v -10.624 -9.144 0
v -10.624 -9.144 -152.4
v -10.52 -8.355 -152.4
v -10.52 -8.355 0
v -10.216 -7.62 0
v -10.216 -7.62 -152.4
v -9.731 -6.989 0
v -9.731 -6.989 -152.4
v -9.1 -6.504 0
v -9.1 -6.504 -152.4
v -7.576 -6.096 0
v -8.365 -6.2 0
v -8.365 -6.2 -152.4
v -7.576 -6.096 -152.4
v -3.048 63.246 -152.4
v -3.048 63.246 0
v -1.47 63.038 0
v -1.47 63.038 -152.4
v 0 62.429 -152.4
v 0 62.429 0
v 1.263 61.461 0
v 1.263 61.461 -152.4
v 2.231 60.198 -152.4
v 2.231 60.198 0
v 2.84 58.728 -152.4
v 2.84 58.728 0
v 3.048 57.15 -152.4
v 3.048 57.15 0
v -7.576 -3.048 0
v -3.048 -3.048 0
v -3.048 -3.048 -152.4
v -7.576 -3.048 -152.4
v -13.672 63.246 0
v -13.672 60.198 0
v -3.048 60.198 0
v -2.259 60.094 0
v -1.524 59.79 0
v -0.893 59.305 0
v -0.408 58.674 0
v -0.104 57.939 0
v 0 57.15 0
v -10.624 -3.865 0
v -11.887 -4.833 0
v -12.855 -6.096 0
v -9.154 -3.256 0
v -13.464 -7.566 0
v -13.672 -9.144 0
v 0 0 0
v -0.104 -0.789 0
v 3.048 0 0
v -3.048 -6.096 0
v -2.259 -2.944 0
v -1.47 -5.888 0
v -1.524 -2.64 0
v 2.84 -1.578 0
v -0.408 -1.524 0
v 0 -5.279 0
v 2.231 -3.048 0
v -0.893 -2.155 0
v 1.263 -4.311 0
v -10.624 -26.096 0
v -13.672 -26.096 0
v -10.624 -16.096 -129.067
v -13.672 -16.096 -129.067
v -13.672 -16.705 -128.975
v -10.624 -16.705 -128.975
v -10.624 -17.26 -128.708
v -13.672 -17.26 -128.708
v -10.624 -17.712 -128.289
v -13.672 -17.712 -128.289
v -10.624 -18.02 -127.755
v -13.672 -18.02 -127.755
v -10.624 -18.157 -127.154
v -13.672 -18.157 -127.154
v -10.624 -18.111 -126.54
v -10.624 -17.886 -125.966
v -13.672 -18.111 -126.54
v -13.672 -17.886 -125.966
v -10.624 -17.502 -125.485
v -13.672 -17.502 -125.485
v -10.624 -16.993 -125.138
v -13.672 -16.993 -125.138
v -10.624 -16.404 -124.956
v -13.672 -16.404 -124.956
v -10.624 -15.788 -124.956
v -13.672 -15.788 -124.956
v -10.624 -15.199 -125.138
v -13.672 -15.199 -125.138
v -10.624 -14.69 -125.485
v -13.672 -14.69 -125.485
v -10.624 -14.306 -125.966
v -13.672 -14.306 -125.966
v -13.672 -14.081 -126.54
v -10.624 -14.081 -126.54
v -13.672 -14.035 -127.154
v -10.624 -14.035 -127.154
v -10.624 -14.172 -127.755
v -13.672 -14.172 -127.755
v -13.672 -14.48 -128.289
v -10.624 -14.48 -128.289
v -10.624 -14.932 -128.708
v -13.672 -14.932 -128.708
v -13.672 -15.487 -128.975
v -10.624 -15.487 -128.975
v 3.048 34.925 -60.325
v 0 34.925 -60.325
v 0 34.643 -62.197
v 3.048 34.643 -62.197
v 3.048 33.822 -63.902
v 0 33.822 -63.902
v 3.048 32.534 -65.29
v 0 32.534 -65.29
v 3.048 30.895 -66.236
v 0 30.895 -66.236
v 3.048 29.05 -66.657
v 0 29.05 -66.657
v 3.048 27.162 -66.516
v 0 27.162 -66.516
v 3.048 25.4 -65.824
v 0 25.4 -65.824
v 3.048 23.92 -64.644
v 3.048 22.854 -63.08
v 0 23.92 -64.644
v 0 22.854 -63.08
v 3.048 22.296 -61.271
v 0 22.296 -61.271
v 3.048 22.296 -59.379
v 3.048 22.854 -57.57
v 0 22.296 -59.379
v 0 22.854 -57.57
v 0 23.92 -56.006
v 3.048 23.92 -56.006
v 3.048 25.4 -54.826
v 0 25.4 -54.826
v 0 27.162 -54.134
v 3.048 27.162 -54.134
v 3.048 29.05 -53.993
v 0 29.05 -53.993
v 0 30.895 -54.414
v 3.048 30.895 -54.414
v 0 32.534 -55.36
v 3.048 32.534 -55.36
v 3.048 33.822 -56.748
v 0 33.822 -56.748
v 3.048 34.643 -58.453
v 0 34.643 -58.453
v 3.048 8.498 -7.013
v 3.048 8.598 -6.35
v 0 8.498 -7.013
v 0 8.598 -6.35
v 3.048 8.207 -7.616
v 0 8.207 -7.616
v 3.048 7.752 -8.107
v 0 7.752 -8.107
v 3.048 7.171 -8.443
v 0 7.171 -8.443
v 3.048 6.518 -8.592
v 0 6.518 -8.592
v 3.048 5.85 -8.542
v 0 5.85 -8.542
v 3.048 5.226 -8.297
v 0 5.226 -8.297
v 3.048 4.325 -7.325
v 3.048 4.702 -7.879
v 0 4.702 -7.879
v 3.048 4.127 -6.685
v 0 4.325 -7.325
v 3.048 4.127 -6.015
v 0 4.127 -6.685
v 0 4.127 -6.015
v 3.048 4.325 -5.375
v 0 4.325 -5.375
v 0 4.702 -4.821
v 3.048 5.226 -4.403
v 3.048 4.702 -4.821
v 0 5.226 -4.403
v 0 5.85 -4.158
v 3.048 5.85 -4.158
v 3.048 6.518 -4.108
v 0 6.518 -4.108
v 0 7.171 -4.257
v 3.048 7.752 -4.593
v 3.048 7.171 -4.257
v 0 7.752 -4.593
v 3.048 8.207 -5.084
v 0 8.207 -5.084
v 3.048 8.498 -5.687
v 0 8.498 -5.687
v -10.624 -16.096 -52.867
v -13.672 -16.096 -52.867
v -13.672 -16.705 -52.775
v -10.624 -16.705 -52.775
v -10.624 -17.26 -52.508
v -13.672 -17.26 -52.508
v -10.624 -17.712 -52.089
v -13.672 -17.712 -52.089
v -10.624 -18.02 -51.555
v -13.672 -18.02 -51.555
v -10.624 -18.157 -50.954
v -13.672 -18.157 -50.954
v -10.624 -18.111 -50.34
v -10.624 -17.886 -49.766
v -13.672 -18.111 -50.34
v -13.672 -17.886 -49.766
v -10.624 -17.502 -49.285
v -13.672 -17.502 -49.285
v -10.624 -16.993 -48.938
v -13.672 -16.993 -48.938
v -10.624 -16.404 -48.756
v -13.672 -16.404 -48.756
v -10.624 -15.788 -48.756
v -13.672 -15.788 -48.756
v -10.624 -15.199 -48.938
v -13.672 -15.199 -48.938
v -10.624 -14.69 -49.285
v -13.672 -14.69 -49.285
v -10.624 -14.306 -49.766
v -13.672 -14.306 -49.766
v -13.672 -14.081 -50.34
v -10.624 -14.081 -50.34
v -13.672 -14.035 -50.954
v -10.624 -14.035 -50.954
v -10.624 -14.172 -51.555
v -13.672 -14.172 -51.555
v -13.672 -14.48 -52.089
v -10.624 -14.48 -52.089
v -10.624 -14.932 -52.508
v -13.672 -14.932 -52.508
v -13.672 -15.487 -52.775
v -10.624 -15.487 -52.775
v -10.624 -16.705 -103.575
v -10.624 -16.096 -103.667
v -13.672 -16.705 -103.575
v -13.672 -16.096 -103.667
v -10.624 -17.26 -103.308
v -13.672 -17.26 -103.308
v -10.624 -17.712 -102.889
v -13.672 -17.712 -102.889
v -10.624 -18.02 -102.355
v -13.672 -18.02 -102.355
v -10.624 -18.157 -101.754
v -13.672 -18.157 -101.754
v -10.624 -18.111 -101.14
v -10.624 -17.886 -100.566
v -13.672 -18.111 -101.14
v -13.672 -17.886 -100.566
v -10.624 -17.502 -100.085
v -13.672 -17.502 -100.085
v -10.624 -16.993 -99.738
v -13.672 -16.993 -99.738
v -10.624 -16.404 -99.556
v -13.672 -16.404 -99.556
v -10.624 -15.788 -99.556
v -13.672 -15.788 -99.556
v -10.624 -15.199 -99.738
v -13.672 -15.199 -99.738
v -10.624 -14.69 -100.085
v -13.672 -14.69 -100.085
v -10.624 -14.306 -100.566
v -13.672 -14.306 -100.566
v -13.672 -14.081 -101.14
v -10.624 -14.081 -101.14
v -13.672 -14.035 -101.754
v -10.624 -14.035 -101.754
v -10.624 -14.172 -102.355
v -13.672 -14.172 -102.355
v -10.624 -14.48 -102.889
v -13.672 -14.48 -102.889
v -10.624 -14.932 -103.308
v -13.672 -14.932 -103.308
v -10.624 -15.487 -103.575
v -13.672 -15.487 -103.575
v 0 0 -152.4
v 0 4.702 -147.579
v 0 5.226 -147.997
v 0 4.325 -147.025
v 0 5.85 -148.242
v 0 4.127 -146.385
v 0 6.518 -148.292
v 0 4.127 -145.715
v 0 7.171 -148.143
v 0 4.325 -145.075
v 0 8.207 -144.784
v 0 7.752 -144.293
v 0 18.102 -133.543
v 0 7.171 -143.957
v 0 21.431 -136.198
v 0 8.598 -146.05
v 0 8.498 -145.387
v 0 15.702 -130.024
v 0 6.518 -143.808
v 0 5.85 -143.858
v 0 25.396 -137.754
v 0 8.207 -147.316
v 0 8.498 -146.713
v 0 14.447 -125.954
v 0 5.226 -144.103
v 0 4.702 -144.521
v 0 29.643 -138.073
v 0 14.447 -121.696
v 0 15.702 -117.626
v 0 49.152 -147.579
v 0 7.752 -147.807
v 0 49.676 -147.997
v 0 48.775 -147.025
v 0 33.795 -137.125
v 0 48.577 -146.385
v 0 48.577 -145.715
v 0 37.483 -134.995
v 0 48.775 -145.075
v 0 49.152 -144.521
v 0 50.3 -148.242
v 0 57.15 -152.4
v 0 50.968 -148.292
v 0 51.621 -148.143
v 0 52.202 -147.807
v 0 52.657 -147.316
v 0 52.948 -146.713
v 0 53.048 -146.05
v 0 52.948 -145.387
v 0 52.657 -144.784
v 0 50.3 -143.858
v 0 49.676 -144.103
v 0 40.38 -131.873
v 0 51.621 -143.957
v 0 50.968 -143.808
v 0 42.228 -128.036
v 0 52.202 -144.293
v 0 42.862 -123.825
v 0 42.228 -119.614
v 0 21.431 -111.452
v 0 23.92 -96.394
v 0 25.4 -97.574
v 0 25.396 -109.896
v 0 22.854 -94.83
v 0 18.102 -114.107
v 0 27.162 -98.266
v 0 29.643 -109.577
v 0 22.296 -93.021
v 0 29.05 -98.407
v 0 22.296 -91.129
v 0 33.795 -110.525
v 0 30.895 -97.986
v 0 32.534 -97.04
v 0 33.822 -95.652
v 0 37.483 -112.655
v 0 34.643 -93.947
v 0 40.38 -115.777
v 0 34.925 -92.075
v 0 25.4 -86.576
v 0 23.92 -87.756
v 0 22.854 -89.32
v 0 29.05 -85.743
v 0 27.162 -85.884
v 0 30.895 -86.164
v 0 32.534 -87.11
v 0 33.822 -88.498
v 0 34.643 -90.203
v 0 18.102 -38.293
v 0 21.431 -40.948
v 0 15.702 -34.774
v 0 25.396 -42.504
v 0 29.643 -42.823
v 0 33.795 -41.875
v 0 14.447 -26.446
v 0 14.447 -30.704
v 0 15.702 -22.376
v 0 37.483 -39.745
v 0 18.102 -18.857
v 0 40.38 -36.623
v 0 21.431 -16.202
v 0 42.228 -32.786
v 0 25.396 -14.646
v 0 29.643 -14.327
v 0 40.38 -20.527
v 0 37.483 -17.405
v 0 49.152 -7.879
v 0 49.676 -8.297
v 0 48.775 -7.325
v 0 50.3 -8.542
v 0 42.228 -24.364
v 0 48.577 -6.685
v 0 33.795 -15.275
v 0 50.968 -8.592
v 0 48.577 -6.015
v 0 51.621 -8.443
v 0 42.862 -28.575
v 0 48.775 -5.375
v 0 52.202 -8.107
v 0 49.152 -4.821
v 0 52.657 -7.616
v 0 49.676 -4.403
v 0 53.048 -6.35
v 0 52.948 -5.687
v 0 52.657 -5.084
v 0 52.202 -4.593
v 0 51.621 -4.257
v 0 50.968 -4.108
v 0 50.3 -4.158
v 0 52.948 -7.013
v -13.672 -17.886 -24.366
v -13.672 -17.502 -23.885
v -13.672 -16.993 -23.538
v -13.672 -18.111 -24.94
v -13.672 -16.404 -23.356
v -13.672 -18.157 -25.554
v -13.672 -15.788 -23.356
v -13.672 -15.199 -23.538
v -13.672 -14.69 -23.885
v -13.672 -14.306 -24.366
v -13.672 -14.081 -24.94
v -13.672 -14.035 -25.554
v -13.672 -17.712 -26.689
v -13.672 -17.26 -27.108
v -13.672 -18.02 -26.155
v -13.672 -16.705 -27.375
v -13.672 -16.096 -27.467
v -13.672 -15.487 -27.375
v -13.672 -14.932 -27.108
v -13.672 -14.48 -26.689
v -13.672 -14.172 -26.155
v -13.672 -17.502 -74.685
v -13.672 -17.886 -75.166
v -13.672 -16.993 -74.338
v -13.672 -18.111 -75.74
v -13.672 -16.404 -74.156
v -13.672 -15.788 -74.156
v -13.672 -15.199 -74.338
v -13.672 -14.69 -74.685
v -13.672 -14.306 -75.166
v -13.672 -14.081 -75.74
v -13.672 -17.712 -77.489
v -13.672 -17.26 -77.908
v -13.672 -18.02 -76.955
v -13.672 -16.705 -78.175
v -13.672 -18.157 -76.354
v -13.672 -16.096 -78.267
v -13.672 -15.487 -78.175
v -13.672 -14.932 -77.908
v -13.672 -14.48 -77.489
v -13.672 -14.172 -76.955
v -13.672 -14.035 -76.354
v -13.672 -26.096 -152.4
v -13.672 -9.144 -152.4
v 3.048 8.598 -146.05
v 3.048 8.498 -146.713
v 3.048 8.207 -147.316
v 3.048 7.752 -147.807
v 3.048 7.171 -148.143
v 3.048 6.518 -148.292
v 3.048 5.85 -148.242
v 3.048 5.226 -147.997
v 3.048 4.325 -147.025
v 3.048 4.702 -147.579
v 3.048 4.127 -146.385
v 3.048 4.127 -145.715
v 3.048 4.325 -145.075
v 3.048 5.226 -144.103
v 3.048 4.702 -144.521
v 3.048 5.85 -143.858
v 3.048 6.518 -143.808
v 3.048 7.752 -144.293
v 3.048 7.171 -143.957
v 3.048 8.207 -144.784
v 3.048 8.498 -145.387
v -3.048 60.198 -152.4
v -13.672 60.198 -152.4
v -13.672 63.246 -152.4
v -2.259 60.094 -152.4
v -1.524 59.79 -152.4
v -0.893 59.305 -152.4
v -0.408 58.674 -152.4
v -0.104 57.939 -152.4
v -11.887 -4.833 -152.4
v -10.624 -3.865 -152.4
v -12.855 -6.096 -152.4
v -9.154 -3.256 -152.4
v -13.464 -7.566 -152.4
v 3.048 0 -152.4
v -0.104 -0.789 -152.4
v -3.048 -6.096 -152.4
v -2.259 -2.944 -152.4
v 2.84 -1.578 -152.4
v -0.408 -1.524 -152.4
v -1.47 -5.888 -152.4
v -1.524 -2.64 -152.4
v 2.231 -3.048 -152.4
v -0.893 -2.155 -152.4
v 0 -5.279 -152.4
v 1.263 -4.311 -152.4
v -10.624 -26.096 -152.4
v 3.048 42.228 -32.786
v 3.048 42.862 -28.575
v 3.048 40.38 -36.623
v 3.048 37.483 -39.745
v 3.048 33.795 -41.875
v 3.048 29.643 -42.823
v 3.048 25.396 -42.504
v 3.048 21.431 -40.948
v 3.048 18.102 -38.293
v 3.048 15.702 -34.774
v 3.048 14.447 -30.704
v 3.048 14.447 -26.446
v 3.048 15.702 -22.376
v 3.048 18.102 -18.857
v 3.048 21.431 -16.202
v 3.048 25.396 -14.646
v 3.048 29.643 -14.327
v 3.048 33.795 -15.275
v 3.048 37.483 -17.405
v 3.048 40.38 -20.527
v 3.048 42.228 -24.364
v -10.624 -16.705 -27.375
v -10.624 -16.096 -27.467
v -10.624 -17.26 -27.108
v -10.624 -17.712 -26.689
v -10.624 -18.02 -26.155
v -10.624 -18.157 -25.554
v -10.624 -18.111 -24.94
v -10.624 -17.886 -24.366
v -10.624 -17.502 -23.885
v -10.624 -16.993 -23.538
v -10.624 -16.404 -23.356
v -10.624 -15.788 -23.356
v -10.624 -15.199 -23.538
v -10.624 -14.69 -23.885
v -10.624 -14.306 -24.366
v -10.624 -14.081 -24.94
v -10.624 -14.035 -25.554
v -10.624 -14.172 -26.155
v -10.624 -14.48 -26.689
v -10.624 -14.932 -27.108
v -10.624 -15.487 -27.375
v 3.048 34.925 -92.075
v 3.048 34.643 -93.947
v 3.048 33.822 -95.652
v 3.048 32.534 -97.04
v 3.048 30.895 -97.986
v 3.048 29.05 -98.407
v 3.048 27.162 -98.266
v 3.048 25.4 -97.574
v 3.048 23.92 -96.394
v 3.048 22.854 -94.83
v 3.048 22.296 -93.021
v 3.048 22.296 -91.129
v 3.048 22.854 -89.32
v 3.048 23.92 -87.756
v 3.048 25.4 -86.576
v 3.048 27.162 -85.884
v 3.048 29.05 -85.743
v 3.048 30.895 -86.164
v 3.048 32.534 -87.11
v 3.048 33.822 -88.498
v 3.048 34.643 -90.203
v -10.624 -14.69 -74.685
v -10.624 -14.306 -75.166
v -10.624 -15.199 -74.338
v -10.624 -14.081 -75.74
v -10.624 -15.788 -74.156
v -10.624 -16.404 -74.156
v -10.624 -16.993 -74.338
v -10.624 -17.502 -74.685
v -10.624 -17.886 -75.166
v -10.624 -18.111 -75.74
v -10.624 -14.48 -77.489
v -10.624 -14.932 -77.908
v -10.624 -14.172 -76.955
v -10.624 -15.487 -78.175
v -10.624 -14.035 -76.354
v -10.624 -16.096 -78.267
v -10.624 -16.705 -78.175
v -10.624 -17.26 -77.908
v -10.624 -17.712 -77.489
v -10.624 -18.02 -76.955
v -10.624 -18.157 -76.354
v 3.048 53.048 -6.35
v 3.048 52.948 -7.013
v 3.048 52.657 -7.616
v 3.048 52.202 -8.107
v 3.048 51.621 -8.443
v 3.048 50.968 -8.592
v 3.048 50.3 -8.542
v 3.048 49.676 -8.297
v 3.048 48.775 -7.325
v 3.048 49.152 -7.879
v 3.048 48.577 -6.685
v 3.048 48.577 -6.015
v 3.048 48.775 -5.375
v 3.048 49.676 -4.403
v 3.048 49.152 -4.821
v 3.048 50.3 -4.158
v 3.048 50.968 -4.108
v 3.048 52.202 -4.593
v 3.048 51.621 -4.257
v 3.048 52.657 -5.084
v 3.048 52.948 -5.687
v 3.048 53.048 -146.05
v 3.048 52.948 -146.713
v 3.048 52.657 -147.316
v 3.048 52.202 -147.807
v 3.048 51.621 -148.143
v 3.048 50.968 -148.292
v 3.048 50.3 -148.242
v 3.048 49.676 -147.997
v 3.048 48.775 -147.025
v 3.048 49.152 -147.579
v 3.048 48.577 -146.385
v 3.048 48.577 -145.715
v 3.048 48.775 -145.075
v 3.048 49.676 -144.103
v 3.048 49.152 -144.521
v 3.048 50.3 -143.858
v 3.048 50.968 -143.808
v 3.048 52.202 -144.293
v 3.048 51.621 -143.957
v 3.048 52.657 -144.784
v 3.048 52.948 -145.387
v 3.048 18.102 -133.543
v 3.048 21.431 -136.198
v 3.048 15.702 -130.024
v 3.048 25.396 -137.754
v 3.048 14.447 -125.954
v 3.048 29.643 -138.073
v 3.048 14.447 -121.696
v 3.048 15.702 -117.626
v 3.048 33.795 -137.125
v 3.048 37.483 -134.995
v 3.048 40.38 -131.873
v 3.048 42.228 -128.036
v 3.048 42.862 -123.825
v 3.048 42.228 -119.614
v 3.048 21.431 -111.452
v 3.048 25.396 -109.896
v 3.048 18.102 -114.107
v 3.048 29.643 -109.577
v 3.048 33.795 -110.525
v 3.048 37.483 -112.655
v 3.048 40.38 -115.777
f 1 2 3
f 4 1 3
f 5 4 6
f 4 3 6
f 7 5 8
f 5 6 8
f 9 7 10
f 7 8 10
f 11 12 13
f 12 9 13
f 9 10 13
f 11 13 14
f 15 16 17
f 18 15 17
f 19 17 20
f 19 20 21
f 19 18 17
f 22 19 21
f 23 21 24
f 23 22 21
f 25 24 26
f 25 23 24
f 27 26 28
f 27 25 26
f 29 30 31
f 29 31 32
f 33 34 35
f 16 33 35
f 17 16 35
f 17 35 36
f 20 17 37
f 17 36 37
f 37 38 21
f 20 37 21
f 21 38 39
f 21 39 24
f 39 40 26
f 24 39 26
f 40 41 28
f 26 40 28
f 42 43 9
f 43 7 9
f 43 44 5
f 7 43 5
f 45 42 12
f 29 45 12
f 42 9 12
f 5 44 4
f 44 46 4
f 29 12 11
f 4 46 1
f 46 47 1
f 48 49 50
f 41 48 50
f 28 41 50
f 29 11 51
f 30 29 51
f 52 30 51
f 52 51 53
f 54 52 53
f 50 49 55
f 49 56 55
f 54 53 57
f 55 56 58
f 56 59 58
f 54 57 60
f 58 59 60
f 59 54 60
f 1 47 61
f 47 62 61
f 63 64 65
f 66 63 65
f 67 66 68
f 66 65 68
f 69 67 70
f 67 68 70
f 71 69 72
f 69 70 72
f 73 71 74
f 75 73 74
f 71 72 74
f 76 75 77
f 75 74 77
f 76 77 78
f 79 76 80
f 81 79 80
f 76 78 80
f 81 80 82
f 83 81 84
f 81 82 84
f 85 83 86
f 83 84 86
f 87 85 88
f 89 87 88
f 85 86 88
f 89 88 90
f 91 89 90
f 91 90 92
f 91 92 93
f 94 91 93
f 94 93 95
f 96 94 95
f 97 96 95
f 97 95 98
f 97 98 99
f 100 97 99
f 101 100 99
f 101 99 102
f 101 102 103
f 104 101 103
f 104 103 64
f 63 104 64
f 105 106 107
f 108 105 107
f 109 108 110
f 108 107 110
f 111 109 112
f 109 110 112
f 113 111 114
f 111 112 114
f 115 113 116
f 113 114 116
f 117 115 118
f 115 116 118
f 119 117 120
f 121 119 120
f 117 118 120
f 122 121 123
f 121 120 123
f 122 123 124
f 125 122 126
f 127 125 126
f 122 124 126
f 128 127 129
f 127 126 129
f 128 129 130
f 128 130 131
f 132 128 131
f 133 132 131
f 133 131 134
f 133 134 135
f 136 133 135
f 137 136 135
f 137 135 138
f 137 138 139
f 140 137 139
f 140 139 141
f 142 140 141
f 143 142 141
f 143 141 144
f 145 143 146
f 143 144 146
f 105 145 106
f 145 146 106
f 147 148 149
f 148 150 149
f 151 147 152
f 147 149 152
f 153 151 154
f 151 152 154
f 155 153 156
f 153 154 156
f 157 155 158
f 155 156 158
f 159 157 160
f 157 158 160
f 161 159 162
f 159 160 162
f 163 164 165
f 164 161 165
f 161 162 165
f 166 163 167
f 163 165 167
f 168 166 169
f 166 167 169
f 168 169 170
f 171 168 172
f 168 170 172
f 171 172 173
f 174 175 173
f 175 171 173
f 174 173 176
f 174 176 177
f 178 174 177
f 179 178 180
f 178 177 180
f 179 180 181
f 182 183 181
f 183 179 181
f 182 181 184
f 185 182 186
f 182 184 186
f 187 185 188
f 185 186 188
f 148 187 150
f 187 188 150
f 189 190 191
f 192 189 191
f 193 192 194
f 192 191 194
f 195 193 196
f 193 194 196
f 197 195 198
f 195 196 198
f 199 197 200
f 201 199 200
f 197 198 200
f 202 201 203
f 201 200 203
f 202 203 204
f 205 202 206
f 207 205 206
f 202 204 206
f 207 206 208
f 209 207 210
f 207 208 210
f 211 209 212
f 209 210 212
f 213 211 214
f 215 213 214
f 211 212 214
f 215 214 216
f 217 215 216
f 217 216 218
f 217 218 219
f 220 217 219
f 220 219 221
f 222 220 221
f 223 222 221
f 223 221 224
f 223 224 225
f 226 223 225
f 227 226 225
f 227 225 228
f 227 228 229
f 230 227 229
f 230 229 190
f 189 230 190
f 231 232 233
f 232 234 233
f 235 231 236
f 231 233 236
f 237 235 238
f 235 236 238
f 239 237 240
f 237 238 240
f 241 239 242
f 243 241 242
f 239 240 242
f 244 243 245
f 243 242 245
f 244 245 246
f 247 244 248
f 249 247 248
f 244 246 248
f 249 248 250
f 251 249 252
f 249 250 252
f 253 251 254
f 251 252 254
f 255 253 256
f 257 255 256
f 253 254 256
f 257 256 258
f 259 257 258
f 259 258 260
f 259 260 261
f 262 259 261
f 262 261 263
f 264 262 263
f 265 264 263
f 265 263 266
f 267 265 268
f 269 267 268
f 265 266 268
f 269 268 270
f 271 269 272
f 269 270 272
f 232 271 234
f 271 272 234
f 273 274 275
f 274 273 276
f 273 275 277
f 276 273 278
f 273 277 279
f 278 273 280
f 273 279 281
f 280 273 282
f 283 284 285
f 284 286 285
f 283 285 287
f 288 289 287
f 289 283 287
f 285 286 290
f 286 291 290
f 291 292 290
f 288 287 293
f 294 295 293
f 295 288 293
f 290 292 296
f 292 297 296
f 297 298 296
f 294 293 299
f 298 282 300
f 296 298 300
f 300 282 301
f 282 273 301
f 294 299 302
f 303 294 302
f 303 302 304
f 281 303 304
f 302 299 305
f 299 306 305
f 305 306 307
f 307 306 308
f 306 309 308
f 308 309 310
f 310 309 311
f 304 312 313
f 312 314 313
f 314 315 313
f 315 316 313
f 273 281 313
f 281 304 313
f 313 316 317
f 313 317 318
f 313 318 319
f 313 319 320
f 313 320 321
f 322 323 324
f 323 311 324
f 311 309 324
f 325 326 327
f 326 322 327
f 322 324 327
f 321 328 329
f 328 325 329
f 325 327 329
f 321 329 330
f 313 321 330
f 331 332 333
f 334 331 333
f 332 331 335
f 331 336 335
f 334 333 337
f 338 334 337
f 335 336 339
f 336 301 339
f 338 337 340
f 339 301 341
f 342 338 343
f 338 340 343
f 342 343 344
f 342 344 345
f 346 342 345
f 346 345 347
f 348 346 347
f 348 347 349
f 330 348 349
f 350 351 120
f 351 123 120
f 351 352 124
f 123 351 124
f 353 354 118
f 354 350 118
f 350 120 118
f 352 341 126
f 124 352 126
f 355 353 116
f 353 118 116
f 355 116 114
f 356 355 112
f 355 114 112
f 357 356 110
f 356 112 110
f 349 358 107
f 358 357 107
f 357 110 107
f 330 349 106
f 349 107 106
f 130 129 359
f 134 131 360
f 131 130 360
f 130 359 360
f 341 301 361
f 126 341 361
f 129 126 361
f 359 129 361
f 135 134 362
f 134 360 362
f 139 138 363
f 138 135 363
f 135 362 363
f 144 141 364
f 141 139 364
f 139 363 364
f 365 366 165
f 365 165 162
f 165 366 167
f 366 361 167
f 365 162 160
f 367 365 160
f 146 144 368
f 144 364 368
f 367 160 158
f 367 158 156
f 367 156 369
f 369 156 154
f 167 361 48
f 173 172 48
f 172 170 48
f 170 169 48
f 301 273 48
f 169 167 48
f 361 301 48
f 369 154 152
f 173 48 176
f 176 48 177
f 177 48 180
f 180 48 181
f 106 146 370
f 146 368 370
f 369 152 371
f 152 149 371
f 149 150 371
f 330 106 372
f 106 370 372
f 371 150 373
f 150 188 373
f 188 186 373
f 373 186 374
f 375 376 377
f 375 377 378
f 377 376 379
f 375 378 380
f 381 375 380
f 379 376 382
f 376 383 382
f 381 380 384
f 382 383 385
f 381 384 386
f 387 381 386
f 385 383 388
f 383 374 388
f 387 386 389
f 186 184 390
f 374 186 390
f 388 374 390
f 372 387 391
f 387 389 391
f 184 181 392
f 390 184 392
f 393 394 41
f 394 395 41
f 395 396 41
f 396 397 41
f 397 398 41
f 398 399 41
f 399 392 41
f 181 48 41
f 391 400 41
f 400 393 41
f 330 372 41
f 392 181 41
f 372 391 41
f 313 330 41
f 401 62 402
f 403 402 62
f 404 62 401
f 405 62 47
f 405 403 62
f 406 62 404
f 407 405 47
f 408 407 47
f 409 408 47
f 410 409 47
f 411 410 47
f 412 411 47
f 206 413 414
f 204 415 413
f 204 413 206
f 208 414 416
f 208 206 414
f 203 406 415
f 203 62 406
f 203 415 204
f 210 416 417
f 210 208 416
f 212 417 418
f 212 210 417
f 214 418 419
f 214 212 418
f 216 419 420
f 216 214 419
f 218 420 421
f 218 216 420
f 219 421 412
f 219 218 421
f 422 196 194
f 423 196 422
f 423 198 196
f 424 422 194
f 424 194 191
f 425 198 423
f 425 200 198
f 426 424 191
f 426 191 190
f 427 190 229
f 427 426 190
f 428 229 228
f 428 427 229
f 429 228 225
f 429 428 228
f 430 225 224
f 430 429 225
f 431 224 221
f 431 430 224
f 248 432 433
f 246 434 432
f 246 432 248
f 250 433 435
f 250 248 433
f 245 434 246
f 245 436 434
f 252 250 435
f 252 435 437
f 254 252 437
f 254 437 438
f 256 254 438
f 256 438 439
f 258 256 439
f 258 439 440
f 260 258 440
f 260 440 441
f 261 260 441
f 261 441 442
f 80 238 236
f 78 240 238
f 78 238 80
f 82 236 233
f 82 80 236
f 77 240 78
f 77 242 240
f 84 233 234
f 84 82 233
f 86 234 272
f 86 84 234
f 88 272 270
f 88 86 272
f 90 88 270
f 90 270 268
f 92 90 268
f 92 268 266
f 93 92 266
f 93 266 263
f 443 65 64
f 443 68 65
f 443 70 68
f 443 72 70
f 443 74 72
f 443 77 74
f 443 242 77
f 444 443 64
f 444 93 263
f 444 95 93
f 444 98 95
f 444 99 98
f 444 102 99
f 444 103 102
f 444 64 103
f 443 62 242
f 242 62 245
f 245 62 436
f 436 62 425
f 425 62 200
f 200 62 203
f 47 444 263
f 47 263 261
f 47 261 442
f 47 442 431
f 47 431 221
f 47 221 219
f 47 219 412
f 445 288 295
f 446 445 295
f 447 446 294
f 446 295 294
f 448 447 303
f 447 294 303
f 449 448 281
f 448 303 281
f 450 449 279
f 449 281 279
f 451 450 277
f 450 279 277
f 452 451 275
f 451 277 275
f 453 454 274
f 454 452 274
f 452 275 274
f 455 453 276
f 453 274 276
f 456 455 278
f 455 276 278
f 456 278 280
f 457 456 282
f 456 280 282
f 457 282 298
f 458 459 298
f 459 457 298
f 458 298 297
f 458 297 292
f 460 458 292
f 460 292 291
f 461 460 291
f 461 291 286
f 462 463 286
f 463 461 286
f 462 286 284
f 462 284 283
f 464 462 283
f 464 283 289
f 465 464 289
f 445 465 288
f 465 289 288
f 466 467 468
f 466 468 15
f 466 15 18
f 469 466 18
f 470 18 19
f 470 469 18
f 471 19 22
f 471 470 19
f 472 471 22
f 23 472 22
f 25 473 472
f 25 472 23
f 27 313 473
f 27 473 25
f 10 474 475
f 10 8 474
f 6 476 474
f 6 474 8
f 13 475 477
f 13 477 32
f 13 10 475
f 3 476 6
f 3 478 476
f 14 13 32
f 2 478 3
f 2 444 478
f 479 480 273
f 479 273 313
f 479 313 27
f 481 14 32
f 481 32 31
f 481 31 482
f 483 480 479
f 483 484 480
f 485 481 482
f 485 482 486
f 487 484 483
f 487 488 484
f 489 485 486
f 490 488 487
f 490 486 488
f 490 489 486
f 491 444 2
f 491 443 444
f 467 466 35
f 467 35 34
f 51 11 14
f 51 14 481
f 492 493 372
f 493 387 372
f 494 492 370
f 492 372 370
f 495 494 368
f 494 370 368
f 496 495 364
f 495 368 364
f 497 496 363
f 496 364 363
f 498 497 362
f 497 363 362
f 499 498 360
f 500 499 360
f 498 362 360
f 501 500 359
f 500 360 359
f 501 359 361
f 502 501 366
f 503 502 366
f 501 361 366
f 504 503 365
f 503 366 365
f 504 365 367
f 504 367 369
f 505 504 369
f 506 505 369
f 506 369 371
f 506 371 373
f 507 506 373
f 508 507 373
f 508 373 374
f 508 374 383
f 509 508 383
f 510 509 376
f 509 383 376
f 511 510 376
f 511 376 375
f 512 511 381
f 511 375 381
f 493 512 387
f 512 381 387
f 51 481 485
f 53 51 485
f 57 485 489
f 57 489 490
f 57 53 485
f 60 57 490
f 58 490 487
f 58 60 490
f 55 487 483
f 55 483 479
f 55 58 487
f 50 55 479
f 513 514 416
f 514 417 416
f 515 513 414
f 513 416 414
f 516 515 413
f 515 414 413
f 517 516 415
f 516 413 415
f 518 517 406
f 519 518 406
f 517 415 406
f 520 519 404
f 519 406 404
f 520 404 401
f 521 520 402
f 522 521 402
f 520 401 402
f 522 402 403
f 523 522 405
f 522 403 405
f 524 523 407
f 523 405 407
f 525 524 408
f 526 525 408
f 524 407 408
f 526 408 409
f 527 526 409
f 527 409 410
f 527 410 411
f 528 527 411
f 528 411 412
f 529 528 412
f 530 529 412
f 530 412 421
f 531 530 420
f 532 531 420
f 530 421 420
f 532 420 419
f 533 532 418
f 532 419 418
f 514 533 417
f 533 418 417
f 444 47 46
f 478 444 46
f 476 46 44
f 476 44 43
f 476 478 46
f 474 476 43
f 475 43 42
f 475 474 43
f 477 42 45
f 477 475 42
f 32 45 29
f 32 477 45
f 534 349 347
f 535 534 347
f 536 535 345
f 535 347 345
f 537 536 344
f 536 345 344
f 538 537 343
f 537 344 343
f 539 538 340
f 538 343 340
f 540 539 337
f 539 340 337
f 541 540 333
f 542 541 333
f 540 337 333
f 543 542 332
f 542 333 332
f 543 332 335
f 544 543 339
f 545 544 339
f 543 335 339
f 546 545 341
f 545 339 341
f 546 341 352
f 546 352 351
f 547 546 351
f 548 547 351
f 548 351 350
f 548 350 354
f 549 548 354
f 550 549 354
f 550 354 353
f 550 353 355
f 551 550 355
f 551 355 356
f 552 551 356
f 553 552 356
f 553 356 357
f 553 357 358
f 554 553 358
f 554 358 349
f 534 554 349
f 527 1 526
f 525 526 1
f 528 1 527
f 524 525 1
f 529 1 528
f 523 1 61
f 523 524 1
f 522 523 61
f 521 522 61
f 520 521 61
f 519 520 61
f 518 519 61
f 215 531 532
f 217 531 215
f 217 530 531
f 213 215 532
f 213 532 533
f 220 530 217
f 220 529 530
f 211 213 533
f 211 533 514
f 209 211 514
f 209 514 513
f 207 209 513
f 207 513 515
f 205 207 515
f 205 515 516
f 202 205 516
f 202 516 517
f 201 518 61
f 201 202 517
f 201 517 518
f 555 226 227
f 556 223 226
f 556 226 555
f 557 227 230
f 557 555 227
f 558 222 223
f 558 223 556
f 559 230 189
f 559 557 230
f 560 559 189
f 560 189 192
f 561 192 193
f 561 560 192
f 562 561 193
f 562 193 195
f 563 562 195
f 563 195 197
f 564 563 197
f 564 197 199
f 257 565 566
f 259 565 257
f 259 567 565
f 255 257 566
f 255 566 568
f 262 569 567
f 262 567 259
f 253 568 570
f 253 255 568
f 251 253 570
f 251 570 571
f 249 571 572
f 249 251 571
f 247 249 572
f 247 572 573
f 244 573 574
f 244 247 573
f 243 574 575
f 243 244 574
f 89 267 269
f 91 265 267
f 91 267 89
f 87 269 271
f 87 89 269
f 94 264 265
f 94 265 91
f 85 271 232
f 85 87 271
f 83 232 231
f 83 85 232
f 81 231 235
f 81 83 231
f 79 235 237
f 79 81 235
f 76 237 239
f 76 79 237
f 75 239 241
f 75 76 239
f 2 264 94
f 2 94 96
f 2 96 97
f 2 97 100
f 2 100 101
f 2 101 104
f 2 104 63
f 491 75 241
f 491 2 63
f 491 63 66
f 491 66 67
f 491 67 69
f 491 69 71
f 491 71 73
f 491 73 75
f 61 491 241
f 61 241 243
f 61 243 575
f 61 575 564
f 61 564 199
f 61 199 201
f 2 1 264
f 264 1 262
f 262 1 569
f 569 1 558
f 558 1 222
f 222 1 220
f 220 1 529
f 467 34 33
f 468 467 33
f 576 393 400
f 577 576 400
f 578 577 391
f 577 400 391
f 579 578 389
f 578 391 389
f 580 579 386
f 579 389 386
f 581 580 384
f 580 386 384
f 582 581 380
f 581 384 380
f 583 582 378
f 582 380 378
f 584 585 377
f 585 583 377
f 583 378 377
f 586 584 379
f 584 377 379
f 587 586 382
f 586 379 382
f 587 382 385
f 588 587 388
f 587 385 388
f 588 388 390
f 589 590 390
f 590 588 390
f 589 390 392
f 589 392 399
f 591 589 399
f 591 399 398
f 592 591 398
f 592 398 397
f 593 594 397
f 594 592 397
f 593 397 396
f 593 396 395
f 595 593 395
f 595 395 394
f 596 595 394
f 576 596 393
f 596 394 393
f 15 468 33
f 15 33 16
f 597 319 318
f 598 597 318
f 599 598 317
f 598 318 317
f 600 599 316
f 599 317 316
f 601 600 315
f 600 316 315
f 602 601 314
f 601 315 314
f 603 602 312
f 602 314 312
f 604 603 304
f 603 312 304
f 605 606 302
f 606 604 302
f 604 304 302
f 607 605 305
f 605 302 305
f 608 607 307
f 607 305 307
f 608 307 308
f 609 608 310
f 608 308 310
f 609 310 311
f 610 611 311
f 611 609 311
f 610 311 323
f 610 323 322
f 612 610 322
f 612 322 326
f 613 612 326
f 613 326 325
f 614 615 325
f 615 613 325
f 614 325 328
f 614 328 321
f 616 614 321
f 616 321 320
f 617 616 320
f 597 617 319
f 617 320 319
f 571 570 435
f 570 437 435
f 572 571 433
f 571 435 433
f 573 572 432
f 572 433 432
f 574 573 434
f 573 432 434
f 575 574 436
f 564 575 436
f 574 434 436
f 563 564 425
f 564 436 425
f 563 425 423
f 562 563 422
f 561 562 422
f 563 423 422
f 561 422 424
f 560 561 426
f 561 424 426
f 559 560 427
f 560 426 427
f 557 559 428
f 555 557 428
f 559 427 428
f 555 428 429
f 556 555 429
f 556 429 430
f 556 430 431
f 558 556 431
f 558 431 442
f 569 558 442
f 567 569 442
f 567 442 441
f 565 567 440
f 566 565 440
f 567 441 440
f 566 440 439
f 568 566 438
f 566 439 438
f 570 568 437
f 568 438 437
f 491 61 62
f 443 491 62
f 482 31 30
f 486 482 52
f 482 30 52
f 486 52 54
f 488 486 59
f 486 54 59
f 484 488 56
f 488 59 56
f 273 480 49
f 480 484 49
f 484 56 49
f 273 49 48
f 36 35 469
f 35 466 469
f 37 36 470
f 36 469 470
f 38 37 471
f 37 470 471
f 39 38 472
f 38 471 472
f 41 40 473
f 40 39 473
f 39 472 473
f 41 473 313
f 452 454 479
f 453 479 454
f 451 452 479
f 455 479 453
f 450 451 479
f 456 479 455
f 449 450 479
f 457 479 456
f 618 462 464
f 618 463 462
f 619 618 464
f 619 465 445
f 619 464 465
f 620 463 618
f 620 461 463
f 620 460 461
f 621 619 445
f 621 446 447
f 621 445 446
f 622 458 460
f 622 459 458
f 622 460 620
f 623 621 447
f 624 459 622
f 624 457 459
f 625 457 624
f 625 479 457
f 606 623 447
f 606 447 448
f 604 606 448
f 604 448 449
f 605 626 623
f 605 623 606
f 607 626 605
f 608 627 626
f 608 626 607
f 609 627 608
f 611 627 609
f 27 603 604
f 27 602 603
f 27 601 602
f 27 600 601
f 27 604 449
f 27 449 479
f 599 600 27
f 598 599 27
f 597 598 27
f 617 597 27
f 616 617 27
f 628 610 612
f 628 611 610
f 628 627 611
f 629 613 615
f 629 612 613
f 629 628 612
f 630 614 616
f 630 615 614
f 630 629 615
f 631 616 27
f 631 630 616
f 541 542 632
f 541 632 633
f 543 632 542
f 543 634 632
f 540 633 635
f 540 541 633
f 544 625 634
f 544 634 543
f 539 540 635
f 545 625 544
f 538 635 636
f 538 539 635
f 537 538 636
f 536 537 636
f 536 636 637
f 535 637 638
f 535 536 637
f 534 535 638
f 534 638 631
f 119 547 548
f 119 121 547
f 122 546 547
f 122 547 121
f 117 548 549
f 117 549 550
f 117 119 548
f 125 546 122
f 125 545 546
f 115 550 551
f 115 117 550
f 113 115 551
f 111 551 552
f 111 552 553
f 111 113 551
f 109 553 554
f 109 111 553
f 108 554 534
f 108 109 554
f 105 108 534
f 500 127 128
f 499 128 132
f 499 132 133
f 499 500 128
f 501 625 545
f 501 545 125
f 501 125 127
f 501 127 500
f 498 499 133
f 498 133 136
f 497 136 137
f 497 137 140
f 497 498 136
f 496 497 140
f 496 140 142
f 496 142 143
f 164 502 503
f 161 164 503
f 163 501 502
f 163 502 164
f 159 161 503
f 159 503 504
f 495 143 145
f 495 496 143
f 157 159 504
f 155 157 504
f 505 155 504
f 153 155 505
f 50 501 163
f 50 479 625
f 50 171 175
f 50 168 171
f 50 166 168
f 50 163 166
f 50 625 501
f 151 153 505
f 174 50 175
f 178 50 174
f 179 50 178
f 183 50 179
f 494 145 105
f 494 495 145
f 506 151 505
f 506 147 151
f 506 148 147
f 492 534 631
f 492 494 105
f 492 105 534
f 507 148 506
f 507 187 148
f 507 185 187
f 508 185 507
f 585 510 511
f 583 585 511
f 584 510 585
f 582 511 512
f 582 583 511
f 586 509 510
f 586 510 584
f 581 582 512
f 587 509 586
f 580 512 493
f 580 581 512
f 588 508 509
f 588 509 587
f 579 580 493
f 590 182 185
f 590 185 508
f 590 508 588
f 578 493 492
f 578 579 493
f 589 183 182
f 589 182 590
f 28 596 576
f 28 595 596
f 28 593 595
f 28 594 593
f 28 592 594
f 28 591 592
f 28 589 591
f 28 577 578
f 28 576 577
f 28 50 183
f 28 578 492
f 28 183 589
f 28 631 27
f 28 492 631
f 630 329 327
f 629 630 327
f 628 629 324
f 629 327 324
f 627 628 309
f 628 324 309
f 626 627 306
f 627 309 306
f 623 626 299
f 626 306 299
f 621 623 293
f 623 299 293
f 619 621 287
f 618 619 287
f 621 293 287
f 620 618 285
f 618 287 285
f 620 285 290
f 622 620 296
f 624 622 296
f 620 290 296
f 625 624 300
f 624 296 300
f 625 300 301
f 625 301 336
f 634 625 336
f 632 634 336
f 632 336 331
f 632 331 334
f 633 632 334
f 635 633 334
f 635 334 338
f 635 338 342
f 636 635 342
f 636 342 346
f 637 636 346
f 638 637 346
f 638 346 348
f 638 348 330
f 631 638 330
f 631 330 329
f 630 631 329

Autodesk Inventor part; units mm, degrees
ref_plane "YZ Plane" through (0, 0, 0) normal (1, 0, 0) x (0, 1, 0)
ref_plane "XZ Plane" through (0, 0, 0) normal (0, 1, 0) x (-1, 0, 0)
ref_plane "XY Plane" through (0, 0, 0) normal (0, 0, 1) x (1, 0, 0)
sketch "Sketch3" plane through (-13.672, 63.246, 0) normal (0, 1, 0) x (1, 0, 0)
  line L0 (10.624, 0) -> (10.624, 152.4) projected
  line L1 (0, 152.4) -> (10.624, 152.4) projected
  line L2 (0, 0) -> (0, 152.4) projected
  line L3 (10.624, 0) -> (0, 0) projected
  point P0 (13.672, 0)
  point P1 (5.312, 127)
  point P2 (5.312, 152.4)
  point P3 (5.312, 101.6)
  point P4 (5.312, 76.2)
  point P5 (5.312, 50.8)
  point P6 (5.312, 25.4)
  dimension "d28" = 25.4
  dimension "d31" = 25.4
sketch "Sketch1" plane through (0, 0, 0) normal (1, 0, 0) x (0, 1, 0)
  line L0 (0, 0) -> (57.15, 0)
  line L1 (57.15, 0) -> (57.15, -152.4)
  line L2 (57.15, -152.4) -> (0, -152.4)
  line L3 (0, -152.4) -> (0, 0)
  circle A0 centre (28.575, -28.575) radius 14.2875
  circle A1 centre (28.575, -60.325) radius 6.35
  circle A2 centre (28.575, -92.075) radius 6.35
  circle A3 centre (28.575, -123.825) radius 14.2875
  circle A4 centre (50.8, -6.35) radius 2.2479
  circle A5 centre (50.8, -146.05) radius 2.2479
  circle A6 centre (6.35, -146.05) radius 2.2479
  circle A7 centre (6.35, -6.35) radius 2.2479
  line L4 (50.8, -6.35) -> (6.35, -6.35) construction
  line L5 (6.35, -6.35) -> (6.35, -146.05) construction
  line L6 (6.35, -146.05) -> (50.8, -146.05) construction
  line L7 (50.8, -146.05) -> (50.8, -6.35) construction
  line L8 (57.15, 0) -> (69.85, 0)
  line L9 (69.85, 0) -> (69.85, -152.4)
  line L10 (69.85, -152.4) -> (57.15, -152.4)
  line L11 (57.15, -152.4) -> (57.15, 0)
  line L12 (0, -152.4) -> (-12.7, -152.4)
  line L13 (-12.7, -152.4) -> (-12.7, 0)
  line L14 (-12.7, 0) -> (0, 0)
  line L15 (0, 0) -> (0, -152.4)
  line L16 (28.575, -123.825) -> (28.575, -28.575)
  point P0 (28.575, -152.4)
  point P1 (28.575, -6.35)
  point P2 (28.575, 0)
  point P3 (50.8, -76.2)
  point P4 (57.15, -76.2)
  point P5 (57.15, -76.2)
  point P6 (28.575, -76.2)
  dimension "d0" = 57.15
  dimension "d1" = 152.4
  dimension "d2" = 31.75
  dimension "d3" = 31.75
  dimension "d4" = 31.75
  dimension "d6" = 28.575
  dimension "d7" = 12.7
  dimension "d8" = 28.575
  dimension "d11" = 4.4958
  dimension "d12" = 139.7
  dimension "d13" = 44.45
  dimension "d14" = 12.7
  dimension "d15" = 152.4
  dimension "d16" = 12.7
  dimension "d17" = 152.4
extrude "Plate2" add sketch "Sketch1" along normal blind 3.048 contours L0 L1 L2 L3
sketch "Sketch2" plane through (-3.048, 60.198, -152.4) normal (0, 1, 0) x (-1, 0, 0)
  line L0 (0, 152.4) -> (0, 0)
  line L1 (0, 0) -> (10.624, 0)
  line L2 (10.624, 0) -> (10.624, 152.4)
  line L3 (10.624, 152.4) -> (0, 152.4)
edge flange "Flange1" height 16.72 angle 90 thickness 3.048 bend radius 3.048 thickness toward (0, 1, 0) relief tear relief width 3.048 relief depth 1.524 corner gap 3.048 corner form 0 edges at (0, 57.15, -76.2) (0, 0, -76.2) wall of the first edge with corners at (-3.048, 60.198, 0) (-3.048, 60.198, -152.4) (-13.672, 60.198, -152.4) (-13.672, 60.198, 0)
bend "Bend1"
corner "Corner1"
sketch "Sketch4" plane through (-10.624, -3.048, -152.4) normal (-1, 0, 0) x (0, -1, 0)
  line L0 (0, 152.4) -> (0, 0)
  line L1 (0, 0) -> (23.048, 0)
  line L2 (23.048, 0) -> (23.048, 152.4)
  line L3 (23.048, 152.4) -> (0, 152.4)
edge flange "Flange2" height 20 angle 90 thickness 3.048 bend radius 3.048 thickness toward (-1, 0, 0) relief tear relief width 3.048 relief depth 1.524 edges at (-13.672, -6.096, -76.2) wall of the first edge with corners at (-10.624, -3.048, 0) (-10.624, -3.048, -152.4) (-10.624, -26.096, -152.4) (-10.624, -26.096, 0)
bend "Bend2"
corner "Corner2"
sketch "Sketch5" plane through (-10.624, -26.096, 0) normal (1, 0, 0) x (0, 0, -1)
  line L0 (152.4, 16.952) -> (152.4, 0) projected
  line L1 (0, 0) -> (152.4, 0) projected
  point P0 (0, 26.096)
  point P1 (127, 10)
  point P2 (101.6, 10)
  point P3 (76.2, 10)
  point P4 (50.8, 10)
  point P5 (25.4, 10)
  dimension "d53" = 25.4
  dimension "d54" = 10
  dimension "d57" = 25.4
hole "Hole2" at (-10.624, -16.096, -127) at (-10.624, -16.096, -101.6) at (-10.624, -16.096, -76.2) at (-10.624, -16.096, -50.8) at (-10.624, -16.096, -25.4) direction (-1, 0, 0) diameter 4.134 end through all
equation "\"d10\" = Thickness"
equation "\"d18\" = BendReliefWidth"
equation "\"d19\" = BendReliefDepth"
equation "\"d20\" = MinimumRemnant"
equation "\"d21\" = TransitionRadius"
equation "\"d24\" = BendRadius"
equation "\"d25\" = CornerReliefSize"
equation "\"d26\" = GapSize"
equation "\"d27\" = JacobiRadiusSize"
equation "\"d43\" = BendReliefWidth"
equation "\"d44\" = BendReliefDepth"
equation "\"d45\" = MinimumRemnant"
equation "\"d46\" = TransitionRadius"
equation "\"d49\" = BendRadius"
equation "\"d50\" = CornerReliefSize"
equation "\"d51\" = GapSize"
equation "\"d52\" = JacobiRadiusSize"
equation "\"BendRadius\" = Thickness"
equation "\"BendReliefWidth\" = Thickness"
equation "\"BendReliefDepth\" = 0.5 * Thickness"
equation "\"CornerReliefSize\" = 4 * Thickness"
equation "\"MinimumRemnant\" = 2 * Thickness"
equation "\"TransitionRadius\" = BendRadius"
equation "\"JacobiRadiusSize\" = BendRadius"
equation "\"GapSize\" = Thickness"
equation "\"Thickness\" = 3.048"
properties part number "CH-1-01-GearboxHousingMotorSide" material "Steel, Alloy"
